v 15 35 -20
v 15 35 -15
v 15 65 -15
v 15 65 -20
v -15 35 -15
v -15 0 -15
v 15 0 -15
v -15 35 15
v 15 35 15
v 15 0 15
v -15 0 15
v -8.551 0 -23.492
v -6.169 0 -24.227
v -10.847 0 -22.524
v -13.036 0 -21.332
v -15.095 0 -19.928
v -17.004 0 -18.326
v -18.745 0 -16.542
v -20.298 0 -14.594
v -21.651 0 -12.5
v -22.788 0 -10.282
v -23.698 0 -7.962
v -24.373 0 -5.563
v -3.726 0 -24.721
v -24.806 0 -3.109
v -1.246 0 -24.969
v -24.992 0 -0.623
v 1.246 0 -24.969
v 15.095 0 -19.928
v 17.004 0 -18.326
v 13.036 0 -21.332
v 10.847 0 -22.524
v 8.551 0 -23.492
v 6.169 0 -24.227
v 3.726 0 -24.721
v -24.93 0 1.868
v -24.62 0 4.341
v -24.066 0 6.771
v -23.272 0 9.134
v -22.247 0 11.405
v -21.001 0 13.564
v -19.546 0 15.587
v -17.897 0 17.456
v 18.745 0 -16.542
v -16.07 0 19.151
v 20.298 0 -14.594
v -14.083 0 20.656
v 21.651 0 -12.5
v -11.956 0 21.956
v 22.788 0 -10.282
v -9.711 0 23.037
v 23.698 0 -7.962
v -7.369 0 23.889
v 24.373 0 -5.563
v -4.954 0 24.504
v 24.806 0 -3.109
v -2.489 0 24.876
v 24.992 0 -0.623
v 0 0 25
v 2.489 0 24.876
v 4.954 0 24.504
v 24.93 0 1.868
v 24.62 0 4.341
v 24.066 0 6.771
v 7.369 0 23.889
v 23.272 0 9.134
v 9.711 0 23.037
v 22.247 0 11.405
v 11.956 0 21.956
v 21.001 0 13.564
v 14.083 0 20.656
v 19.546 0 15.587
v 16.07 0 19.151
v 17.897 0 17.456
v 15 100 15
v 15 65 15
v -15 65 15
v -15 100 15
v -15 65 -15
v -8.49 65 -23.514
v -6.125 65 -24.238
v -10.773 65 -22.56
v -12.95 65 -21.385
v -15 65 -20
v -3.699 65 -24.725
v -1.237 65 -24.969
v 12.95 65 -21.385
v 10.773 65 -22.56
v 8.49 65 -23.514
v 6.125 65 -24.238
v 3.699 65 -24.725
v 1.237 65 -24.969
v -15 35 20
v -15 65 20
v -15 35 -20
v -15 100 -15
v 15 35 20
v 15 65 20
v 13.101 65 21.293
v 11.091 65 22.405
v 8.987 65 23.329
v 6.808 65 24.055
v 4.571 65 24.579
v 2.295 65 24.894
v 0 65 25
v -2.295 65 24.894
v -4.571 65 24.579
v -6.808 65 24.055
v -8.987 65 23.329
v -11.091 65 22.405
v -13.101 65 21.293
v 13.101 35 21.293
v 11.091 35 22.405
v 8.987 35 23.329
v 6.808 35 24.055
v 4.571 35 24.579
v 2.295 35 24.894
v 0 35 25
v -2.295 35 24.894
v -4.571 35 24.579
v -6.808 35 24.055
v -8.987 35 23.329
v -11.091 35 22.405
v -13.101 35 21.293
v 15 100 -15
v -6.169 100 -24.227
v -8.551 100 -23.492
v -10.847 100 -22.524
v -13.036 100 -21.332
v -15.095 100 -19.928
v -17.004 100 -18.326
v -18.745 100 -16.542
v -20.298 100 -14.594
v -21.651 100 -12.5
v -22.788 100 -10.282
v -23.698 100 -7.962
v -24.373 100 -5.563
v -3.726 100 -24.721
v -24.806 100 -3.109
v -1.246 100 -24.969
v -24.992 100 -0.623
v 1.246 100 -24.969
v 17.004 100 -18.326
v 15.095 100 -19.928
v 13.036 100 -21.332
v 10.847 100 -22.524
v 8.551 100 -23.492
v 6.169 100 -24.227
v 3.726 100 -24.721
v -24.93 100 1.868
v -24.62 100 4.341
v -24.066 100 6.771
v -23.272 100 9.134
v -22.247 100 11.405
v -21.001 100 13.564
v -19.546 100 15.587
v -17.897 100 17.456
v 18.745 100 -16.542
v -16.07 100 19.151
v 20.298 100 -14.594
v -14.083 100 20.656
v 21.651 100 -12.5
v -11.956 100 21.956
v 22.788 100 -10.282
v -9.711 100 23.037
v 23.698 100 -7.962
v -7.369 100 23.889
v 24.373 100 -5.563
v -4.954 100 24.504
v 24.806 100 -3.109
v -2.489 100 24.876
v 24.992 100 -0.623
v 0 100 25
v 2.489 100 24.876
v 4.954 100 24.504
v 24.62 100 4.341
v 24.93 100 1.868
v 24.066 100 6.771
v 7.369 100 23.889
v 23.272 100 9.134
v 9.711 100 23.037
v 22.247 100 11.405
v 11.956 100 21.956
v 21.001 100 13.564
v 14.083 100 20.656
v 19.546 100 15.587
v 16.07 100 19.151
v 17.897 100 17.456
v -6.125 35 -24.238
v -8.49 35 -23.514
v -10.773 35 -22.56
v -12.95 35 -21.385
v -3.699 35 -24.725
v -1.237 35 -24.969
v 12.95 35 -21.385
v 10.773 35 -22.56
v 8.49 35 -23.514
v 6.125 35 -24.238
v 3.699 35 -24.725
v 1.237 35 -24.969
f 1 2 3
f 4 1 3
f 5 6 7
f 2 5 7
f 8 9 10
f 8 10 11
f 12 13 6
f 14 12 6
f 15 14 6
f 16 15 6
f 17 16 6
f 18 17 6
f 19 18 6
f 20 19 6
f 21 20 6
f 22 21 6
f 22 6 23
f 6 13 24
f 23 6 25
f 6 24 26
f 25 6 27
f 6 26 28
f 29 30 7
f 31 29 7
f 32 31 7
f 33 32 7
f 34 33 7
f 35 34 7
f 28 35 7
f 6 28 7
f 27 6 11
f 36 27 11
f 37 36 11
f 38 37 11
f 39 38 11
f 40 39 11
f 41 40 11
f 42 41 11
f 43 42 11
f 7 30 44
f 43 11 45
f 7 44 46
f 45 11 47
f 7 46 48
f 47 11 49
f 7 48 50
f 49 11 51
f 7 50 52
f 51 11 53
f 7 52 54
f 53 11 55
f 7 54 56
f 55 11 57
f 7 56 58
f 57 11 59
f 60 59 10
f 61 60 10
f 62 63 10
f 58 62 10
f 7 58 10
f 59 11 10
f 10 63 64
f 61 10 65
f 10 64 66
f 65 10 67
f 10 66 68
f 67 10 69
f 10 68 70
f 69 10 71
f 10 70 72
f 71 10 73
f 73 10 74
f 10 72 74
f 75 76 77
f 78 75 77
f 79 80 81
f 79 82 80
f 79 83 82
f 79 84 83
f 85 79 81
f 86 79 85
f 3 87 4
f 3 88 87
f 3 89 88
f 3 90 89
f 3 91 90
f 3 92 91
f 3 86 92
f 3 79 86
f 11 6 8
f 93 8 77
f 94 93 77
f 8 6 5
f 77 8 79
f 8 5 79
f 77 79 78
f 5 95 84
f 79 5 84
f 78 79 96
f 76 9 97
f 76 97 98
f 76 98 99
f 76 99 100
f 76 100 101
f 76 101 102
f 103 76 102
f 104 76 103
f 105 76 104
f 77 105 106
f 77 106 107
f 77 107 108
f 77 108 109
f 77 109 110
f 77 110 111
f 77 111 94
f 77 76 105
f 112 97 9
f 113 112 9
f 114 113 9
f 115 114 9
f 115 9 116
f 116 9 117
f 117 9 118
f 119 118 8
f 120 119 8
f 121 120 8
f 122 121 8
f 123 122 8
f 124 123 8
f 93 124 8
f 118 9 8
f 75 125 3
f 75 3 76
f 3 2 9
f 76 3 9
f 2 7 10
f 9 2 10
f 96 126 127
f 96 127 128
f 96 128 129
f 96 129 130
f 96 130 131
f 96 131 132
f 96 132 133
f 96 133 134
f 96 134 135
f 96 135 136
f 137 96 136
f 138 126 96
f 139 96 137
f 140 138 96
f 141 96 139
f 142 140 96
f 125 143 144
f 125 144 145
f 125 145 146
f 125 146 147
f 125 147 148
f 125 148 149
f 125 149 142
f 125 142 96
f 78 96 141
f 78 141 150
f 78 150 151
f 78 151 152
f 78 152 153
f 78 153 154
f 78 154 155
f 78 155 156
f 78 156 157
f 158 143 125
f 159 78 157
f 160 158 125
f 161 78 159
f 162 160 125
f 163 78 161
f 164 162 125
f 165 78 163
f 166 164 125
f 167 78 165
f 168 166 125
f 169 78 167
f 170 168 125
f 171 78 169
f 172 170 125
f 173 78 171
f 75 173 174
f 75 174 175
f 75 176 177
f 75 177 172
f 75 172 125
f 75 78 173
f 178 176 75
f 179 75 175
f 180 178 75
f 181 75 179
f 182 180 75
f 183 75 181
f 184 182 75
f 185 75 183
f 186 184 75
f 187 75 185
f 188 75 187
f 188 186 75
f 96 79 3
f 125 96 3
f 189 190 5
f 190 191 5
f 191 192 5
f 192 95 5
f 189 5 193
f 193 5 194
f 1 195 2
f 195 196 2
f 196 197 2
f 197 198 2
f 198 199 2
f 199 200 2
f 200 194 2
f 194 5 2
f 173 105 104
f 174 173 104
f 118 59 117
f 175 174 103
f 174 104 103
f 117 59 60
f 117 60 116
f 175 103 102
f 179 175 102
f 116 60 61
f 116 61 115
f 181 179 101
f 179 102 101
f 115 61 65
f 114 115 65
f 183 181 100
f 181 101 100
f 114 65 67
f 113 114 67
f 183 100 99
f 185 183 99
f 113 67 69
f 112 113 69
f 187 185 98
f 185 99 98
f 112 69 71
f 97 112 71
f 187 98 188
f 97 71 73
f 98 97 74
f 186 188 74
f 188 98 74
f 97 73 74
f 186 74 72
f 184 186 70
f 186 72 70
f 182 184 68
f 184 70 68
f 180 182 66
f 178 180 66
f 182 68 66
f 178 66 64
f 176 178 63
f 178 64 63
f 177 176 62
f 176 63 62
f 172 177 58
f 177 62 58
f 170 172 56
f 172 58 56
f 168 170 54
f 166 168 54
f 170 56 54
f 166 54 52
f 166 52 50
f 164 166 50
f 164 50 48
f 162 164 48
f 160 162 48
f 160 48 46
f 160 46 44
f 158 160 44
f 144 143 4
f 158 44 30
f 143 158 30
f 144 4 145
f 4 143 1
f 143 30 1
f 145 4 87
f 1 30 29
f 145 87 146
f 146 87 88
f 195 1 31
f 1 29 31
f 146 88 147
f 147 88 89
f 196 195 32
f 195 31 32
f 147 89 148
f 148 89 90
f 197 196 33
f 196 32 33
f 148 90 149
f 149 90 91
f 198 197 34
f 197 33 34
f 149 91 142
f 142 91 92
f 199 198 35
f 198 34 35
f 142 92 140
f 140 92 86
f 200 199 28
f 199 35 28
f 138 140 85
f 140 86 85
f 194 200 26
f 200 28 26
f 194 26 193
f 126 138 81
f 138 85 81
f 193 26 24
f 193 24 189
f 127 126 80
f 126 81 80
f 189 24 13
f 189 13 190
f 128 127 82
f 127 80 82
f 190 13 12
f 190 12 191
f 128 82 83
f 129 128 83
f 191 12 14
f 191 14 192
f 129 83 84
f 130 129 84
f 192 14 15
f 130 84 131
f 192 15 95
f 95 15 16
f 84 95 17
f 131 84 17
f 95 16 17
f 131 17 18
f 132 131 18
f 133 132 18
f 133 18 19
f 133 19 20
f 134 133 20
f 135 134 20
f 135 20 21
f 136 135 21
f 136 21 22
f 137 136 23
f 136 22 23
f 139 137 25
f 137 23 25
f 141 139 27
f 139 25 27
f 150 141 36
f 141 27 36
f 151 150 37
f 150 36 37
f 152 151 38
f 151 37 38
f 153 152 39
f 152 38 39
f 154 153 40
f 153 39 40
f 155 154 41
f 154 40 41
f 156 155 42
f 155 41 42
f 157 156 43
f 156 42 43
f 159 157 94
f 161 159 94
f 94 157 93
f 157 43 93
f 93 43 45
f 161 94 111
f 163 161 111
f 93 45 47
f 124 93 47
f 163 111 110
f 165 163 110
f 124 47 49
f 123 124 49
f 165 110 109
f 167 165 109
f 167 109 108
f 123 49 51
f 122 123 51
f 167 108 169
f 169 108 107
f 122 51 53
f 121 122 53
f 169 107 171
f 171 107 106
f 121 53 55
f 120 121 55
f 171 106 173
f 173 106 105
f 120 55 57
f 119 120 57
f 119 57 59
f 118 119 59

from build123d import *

# Parameters (mm, degrees)
SKETCH1_R               = 25
BOSS_EXTRUDE1_DEPTH     = 100
CUT_EXTRUDE1_DEPTH      = 100
CUT_EXTRUDE2_REACH      = 112.567
CUT_EXTRUDE2_END_RADIUS = 25
SKETCH3_W               = 30
SKETCH3_H               = 30
CUT_EXTRUDE3_REACH      = 112.567
CUT_EXTRUDE3_END_RADIUS = 25
SKETCH4_W               = 30
SKETCH4_H               = 30


with BuildPart() as part:
    # Sketch1 → Boss-Extrude1 (new body)
    with BuildSketch(Plane(origin=(0, 0, 0), x_dir=(1, 0, 0), z_dir=(0, 1, 0))):
        with Locations(Location((0, 0, 0), (0, 0, 270))):
            Circle(SKETCH1_R)
    extrude(amount=BOSS_EXTRUDE1_DEPTH)

    # 3DSketch4 → Cut-Extrude1 (cut)
    with BuildSketch(Plane(origin=(-15, 0, -15), x_dir=(0.7071067811865476, 0, 0.7071067811865476), z_dir=(0, 1, 0))):
        Polygon((0, 0), (21.213203436, 21.213203436), (42.426406871, 0), (21.213203436, -21.213203436), align=None)
    extrude(amount=CUT_EXTRUDE1_DEPTH, mode=Mode.SUBTRACT)

    # Cut-Extrude2: up to this cylinder (the profile starts inside it)
    cut_extrude2_end = Plane(origin=(0, 50, 0), z_dir=(0, -1, 0)) * Cylinder(CUT_EXTRUDE2_END_RADIUS, 276.134, mode=Mode.PRIVATE)
    # Sketch3 → Cut-Extrude2 (cut, up to the surface)
    with BuildSketch(Plane.XY.offset(-15), mode=Mode.PRIVATE) as cut_extrude2_sk1:
        with Locations((0, 50)):
            Rectangle(SKETCH3_W, SKETCH3_H)
    cut_extrude2_tool1 = extrude(cut_extrude2_sk1.sketch, amount=-CUT_EXTRUDE2_REACH, mode=Mode.PRIVATE) & cut_extrude2_end
    add(cut_extrude2_tool1.solids().sort_by_distance((0, 50, -15))[0], mode=Mode.SUBTRACT)

    # Cut-Extrude3: up to this cylinder (the profile starts inside it)
    cut_extrude3_end = Plane(origin=(0, 50, 0), z_dir=(0, -1, 0)) * Cylinder(CUT_EXTRUDE3_END_RADIUS, 276.134, mode=Mode.PRIVATE)
    # Sketch4 → Cut-Extrude3 (cut, up to the surface)
    with BuildSketch(Plane(origin=(0, 0, 15), x_dir=(-1, 0, 0), z_dir=(0, 0, -1)), mode=Mode.PRIVATE) as cut_extrude3_sk1:
        with Locations((0, 50)):
            Rectangle(SKETCH4_W, SKETCH4_H)
    cut_extrude3_tool1 = extrude(cut_extrude3_sk1.sketch, amount=-CUT_EXTRUDE3_REACH, mode=Mode.PRIVATE) & cut_extrude3_end
    add(cut_extrude3_tool1.solids().sort_by_distance((0, 50, 15))[0], mode=Mode.SUBTRACT)


solid = part.part
